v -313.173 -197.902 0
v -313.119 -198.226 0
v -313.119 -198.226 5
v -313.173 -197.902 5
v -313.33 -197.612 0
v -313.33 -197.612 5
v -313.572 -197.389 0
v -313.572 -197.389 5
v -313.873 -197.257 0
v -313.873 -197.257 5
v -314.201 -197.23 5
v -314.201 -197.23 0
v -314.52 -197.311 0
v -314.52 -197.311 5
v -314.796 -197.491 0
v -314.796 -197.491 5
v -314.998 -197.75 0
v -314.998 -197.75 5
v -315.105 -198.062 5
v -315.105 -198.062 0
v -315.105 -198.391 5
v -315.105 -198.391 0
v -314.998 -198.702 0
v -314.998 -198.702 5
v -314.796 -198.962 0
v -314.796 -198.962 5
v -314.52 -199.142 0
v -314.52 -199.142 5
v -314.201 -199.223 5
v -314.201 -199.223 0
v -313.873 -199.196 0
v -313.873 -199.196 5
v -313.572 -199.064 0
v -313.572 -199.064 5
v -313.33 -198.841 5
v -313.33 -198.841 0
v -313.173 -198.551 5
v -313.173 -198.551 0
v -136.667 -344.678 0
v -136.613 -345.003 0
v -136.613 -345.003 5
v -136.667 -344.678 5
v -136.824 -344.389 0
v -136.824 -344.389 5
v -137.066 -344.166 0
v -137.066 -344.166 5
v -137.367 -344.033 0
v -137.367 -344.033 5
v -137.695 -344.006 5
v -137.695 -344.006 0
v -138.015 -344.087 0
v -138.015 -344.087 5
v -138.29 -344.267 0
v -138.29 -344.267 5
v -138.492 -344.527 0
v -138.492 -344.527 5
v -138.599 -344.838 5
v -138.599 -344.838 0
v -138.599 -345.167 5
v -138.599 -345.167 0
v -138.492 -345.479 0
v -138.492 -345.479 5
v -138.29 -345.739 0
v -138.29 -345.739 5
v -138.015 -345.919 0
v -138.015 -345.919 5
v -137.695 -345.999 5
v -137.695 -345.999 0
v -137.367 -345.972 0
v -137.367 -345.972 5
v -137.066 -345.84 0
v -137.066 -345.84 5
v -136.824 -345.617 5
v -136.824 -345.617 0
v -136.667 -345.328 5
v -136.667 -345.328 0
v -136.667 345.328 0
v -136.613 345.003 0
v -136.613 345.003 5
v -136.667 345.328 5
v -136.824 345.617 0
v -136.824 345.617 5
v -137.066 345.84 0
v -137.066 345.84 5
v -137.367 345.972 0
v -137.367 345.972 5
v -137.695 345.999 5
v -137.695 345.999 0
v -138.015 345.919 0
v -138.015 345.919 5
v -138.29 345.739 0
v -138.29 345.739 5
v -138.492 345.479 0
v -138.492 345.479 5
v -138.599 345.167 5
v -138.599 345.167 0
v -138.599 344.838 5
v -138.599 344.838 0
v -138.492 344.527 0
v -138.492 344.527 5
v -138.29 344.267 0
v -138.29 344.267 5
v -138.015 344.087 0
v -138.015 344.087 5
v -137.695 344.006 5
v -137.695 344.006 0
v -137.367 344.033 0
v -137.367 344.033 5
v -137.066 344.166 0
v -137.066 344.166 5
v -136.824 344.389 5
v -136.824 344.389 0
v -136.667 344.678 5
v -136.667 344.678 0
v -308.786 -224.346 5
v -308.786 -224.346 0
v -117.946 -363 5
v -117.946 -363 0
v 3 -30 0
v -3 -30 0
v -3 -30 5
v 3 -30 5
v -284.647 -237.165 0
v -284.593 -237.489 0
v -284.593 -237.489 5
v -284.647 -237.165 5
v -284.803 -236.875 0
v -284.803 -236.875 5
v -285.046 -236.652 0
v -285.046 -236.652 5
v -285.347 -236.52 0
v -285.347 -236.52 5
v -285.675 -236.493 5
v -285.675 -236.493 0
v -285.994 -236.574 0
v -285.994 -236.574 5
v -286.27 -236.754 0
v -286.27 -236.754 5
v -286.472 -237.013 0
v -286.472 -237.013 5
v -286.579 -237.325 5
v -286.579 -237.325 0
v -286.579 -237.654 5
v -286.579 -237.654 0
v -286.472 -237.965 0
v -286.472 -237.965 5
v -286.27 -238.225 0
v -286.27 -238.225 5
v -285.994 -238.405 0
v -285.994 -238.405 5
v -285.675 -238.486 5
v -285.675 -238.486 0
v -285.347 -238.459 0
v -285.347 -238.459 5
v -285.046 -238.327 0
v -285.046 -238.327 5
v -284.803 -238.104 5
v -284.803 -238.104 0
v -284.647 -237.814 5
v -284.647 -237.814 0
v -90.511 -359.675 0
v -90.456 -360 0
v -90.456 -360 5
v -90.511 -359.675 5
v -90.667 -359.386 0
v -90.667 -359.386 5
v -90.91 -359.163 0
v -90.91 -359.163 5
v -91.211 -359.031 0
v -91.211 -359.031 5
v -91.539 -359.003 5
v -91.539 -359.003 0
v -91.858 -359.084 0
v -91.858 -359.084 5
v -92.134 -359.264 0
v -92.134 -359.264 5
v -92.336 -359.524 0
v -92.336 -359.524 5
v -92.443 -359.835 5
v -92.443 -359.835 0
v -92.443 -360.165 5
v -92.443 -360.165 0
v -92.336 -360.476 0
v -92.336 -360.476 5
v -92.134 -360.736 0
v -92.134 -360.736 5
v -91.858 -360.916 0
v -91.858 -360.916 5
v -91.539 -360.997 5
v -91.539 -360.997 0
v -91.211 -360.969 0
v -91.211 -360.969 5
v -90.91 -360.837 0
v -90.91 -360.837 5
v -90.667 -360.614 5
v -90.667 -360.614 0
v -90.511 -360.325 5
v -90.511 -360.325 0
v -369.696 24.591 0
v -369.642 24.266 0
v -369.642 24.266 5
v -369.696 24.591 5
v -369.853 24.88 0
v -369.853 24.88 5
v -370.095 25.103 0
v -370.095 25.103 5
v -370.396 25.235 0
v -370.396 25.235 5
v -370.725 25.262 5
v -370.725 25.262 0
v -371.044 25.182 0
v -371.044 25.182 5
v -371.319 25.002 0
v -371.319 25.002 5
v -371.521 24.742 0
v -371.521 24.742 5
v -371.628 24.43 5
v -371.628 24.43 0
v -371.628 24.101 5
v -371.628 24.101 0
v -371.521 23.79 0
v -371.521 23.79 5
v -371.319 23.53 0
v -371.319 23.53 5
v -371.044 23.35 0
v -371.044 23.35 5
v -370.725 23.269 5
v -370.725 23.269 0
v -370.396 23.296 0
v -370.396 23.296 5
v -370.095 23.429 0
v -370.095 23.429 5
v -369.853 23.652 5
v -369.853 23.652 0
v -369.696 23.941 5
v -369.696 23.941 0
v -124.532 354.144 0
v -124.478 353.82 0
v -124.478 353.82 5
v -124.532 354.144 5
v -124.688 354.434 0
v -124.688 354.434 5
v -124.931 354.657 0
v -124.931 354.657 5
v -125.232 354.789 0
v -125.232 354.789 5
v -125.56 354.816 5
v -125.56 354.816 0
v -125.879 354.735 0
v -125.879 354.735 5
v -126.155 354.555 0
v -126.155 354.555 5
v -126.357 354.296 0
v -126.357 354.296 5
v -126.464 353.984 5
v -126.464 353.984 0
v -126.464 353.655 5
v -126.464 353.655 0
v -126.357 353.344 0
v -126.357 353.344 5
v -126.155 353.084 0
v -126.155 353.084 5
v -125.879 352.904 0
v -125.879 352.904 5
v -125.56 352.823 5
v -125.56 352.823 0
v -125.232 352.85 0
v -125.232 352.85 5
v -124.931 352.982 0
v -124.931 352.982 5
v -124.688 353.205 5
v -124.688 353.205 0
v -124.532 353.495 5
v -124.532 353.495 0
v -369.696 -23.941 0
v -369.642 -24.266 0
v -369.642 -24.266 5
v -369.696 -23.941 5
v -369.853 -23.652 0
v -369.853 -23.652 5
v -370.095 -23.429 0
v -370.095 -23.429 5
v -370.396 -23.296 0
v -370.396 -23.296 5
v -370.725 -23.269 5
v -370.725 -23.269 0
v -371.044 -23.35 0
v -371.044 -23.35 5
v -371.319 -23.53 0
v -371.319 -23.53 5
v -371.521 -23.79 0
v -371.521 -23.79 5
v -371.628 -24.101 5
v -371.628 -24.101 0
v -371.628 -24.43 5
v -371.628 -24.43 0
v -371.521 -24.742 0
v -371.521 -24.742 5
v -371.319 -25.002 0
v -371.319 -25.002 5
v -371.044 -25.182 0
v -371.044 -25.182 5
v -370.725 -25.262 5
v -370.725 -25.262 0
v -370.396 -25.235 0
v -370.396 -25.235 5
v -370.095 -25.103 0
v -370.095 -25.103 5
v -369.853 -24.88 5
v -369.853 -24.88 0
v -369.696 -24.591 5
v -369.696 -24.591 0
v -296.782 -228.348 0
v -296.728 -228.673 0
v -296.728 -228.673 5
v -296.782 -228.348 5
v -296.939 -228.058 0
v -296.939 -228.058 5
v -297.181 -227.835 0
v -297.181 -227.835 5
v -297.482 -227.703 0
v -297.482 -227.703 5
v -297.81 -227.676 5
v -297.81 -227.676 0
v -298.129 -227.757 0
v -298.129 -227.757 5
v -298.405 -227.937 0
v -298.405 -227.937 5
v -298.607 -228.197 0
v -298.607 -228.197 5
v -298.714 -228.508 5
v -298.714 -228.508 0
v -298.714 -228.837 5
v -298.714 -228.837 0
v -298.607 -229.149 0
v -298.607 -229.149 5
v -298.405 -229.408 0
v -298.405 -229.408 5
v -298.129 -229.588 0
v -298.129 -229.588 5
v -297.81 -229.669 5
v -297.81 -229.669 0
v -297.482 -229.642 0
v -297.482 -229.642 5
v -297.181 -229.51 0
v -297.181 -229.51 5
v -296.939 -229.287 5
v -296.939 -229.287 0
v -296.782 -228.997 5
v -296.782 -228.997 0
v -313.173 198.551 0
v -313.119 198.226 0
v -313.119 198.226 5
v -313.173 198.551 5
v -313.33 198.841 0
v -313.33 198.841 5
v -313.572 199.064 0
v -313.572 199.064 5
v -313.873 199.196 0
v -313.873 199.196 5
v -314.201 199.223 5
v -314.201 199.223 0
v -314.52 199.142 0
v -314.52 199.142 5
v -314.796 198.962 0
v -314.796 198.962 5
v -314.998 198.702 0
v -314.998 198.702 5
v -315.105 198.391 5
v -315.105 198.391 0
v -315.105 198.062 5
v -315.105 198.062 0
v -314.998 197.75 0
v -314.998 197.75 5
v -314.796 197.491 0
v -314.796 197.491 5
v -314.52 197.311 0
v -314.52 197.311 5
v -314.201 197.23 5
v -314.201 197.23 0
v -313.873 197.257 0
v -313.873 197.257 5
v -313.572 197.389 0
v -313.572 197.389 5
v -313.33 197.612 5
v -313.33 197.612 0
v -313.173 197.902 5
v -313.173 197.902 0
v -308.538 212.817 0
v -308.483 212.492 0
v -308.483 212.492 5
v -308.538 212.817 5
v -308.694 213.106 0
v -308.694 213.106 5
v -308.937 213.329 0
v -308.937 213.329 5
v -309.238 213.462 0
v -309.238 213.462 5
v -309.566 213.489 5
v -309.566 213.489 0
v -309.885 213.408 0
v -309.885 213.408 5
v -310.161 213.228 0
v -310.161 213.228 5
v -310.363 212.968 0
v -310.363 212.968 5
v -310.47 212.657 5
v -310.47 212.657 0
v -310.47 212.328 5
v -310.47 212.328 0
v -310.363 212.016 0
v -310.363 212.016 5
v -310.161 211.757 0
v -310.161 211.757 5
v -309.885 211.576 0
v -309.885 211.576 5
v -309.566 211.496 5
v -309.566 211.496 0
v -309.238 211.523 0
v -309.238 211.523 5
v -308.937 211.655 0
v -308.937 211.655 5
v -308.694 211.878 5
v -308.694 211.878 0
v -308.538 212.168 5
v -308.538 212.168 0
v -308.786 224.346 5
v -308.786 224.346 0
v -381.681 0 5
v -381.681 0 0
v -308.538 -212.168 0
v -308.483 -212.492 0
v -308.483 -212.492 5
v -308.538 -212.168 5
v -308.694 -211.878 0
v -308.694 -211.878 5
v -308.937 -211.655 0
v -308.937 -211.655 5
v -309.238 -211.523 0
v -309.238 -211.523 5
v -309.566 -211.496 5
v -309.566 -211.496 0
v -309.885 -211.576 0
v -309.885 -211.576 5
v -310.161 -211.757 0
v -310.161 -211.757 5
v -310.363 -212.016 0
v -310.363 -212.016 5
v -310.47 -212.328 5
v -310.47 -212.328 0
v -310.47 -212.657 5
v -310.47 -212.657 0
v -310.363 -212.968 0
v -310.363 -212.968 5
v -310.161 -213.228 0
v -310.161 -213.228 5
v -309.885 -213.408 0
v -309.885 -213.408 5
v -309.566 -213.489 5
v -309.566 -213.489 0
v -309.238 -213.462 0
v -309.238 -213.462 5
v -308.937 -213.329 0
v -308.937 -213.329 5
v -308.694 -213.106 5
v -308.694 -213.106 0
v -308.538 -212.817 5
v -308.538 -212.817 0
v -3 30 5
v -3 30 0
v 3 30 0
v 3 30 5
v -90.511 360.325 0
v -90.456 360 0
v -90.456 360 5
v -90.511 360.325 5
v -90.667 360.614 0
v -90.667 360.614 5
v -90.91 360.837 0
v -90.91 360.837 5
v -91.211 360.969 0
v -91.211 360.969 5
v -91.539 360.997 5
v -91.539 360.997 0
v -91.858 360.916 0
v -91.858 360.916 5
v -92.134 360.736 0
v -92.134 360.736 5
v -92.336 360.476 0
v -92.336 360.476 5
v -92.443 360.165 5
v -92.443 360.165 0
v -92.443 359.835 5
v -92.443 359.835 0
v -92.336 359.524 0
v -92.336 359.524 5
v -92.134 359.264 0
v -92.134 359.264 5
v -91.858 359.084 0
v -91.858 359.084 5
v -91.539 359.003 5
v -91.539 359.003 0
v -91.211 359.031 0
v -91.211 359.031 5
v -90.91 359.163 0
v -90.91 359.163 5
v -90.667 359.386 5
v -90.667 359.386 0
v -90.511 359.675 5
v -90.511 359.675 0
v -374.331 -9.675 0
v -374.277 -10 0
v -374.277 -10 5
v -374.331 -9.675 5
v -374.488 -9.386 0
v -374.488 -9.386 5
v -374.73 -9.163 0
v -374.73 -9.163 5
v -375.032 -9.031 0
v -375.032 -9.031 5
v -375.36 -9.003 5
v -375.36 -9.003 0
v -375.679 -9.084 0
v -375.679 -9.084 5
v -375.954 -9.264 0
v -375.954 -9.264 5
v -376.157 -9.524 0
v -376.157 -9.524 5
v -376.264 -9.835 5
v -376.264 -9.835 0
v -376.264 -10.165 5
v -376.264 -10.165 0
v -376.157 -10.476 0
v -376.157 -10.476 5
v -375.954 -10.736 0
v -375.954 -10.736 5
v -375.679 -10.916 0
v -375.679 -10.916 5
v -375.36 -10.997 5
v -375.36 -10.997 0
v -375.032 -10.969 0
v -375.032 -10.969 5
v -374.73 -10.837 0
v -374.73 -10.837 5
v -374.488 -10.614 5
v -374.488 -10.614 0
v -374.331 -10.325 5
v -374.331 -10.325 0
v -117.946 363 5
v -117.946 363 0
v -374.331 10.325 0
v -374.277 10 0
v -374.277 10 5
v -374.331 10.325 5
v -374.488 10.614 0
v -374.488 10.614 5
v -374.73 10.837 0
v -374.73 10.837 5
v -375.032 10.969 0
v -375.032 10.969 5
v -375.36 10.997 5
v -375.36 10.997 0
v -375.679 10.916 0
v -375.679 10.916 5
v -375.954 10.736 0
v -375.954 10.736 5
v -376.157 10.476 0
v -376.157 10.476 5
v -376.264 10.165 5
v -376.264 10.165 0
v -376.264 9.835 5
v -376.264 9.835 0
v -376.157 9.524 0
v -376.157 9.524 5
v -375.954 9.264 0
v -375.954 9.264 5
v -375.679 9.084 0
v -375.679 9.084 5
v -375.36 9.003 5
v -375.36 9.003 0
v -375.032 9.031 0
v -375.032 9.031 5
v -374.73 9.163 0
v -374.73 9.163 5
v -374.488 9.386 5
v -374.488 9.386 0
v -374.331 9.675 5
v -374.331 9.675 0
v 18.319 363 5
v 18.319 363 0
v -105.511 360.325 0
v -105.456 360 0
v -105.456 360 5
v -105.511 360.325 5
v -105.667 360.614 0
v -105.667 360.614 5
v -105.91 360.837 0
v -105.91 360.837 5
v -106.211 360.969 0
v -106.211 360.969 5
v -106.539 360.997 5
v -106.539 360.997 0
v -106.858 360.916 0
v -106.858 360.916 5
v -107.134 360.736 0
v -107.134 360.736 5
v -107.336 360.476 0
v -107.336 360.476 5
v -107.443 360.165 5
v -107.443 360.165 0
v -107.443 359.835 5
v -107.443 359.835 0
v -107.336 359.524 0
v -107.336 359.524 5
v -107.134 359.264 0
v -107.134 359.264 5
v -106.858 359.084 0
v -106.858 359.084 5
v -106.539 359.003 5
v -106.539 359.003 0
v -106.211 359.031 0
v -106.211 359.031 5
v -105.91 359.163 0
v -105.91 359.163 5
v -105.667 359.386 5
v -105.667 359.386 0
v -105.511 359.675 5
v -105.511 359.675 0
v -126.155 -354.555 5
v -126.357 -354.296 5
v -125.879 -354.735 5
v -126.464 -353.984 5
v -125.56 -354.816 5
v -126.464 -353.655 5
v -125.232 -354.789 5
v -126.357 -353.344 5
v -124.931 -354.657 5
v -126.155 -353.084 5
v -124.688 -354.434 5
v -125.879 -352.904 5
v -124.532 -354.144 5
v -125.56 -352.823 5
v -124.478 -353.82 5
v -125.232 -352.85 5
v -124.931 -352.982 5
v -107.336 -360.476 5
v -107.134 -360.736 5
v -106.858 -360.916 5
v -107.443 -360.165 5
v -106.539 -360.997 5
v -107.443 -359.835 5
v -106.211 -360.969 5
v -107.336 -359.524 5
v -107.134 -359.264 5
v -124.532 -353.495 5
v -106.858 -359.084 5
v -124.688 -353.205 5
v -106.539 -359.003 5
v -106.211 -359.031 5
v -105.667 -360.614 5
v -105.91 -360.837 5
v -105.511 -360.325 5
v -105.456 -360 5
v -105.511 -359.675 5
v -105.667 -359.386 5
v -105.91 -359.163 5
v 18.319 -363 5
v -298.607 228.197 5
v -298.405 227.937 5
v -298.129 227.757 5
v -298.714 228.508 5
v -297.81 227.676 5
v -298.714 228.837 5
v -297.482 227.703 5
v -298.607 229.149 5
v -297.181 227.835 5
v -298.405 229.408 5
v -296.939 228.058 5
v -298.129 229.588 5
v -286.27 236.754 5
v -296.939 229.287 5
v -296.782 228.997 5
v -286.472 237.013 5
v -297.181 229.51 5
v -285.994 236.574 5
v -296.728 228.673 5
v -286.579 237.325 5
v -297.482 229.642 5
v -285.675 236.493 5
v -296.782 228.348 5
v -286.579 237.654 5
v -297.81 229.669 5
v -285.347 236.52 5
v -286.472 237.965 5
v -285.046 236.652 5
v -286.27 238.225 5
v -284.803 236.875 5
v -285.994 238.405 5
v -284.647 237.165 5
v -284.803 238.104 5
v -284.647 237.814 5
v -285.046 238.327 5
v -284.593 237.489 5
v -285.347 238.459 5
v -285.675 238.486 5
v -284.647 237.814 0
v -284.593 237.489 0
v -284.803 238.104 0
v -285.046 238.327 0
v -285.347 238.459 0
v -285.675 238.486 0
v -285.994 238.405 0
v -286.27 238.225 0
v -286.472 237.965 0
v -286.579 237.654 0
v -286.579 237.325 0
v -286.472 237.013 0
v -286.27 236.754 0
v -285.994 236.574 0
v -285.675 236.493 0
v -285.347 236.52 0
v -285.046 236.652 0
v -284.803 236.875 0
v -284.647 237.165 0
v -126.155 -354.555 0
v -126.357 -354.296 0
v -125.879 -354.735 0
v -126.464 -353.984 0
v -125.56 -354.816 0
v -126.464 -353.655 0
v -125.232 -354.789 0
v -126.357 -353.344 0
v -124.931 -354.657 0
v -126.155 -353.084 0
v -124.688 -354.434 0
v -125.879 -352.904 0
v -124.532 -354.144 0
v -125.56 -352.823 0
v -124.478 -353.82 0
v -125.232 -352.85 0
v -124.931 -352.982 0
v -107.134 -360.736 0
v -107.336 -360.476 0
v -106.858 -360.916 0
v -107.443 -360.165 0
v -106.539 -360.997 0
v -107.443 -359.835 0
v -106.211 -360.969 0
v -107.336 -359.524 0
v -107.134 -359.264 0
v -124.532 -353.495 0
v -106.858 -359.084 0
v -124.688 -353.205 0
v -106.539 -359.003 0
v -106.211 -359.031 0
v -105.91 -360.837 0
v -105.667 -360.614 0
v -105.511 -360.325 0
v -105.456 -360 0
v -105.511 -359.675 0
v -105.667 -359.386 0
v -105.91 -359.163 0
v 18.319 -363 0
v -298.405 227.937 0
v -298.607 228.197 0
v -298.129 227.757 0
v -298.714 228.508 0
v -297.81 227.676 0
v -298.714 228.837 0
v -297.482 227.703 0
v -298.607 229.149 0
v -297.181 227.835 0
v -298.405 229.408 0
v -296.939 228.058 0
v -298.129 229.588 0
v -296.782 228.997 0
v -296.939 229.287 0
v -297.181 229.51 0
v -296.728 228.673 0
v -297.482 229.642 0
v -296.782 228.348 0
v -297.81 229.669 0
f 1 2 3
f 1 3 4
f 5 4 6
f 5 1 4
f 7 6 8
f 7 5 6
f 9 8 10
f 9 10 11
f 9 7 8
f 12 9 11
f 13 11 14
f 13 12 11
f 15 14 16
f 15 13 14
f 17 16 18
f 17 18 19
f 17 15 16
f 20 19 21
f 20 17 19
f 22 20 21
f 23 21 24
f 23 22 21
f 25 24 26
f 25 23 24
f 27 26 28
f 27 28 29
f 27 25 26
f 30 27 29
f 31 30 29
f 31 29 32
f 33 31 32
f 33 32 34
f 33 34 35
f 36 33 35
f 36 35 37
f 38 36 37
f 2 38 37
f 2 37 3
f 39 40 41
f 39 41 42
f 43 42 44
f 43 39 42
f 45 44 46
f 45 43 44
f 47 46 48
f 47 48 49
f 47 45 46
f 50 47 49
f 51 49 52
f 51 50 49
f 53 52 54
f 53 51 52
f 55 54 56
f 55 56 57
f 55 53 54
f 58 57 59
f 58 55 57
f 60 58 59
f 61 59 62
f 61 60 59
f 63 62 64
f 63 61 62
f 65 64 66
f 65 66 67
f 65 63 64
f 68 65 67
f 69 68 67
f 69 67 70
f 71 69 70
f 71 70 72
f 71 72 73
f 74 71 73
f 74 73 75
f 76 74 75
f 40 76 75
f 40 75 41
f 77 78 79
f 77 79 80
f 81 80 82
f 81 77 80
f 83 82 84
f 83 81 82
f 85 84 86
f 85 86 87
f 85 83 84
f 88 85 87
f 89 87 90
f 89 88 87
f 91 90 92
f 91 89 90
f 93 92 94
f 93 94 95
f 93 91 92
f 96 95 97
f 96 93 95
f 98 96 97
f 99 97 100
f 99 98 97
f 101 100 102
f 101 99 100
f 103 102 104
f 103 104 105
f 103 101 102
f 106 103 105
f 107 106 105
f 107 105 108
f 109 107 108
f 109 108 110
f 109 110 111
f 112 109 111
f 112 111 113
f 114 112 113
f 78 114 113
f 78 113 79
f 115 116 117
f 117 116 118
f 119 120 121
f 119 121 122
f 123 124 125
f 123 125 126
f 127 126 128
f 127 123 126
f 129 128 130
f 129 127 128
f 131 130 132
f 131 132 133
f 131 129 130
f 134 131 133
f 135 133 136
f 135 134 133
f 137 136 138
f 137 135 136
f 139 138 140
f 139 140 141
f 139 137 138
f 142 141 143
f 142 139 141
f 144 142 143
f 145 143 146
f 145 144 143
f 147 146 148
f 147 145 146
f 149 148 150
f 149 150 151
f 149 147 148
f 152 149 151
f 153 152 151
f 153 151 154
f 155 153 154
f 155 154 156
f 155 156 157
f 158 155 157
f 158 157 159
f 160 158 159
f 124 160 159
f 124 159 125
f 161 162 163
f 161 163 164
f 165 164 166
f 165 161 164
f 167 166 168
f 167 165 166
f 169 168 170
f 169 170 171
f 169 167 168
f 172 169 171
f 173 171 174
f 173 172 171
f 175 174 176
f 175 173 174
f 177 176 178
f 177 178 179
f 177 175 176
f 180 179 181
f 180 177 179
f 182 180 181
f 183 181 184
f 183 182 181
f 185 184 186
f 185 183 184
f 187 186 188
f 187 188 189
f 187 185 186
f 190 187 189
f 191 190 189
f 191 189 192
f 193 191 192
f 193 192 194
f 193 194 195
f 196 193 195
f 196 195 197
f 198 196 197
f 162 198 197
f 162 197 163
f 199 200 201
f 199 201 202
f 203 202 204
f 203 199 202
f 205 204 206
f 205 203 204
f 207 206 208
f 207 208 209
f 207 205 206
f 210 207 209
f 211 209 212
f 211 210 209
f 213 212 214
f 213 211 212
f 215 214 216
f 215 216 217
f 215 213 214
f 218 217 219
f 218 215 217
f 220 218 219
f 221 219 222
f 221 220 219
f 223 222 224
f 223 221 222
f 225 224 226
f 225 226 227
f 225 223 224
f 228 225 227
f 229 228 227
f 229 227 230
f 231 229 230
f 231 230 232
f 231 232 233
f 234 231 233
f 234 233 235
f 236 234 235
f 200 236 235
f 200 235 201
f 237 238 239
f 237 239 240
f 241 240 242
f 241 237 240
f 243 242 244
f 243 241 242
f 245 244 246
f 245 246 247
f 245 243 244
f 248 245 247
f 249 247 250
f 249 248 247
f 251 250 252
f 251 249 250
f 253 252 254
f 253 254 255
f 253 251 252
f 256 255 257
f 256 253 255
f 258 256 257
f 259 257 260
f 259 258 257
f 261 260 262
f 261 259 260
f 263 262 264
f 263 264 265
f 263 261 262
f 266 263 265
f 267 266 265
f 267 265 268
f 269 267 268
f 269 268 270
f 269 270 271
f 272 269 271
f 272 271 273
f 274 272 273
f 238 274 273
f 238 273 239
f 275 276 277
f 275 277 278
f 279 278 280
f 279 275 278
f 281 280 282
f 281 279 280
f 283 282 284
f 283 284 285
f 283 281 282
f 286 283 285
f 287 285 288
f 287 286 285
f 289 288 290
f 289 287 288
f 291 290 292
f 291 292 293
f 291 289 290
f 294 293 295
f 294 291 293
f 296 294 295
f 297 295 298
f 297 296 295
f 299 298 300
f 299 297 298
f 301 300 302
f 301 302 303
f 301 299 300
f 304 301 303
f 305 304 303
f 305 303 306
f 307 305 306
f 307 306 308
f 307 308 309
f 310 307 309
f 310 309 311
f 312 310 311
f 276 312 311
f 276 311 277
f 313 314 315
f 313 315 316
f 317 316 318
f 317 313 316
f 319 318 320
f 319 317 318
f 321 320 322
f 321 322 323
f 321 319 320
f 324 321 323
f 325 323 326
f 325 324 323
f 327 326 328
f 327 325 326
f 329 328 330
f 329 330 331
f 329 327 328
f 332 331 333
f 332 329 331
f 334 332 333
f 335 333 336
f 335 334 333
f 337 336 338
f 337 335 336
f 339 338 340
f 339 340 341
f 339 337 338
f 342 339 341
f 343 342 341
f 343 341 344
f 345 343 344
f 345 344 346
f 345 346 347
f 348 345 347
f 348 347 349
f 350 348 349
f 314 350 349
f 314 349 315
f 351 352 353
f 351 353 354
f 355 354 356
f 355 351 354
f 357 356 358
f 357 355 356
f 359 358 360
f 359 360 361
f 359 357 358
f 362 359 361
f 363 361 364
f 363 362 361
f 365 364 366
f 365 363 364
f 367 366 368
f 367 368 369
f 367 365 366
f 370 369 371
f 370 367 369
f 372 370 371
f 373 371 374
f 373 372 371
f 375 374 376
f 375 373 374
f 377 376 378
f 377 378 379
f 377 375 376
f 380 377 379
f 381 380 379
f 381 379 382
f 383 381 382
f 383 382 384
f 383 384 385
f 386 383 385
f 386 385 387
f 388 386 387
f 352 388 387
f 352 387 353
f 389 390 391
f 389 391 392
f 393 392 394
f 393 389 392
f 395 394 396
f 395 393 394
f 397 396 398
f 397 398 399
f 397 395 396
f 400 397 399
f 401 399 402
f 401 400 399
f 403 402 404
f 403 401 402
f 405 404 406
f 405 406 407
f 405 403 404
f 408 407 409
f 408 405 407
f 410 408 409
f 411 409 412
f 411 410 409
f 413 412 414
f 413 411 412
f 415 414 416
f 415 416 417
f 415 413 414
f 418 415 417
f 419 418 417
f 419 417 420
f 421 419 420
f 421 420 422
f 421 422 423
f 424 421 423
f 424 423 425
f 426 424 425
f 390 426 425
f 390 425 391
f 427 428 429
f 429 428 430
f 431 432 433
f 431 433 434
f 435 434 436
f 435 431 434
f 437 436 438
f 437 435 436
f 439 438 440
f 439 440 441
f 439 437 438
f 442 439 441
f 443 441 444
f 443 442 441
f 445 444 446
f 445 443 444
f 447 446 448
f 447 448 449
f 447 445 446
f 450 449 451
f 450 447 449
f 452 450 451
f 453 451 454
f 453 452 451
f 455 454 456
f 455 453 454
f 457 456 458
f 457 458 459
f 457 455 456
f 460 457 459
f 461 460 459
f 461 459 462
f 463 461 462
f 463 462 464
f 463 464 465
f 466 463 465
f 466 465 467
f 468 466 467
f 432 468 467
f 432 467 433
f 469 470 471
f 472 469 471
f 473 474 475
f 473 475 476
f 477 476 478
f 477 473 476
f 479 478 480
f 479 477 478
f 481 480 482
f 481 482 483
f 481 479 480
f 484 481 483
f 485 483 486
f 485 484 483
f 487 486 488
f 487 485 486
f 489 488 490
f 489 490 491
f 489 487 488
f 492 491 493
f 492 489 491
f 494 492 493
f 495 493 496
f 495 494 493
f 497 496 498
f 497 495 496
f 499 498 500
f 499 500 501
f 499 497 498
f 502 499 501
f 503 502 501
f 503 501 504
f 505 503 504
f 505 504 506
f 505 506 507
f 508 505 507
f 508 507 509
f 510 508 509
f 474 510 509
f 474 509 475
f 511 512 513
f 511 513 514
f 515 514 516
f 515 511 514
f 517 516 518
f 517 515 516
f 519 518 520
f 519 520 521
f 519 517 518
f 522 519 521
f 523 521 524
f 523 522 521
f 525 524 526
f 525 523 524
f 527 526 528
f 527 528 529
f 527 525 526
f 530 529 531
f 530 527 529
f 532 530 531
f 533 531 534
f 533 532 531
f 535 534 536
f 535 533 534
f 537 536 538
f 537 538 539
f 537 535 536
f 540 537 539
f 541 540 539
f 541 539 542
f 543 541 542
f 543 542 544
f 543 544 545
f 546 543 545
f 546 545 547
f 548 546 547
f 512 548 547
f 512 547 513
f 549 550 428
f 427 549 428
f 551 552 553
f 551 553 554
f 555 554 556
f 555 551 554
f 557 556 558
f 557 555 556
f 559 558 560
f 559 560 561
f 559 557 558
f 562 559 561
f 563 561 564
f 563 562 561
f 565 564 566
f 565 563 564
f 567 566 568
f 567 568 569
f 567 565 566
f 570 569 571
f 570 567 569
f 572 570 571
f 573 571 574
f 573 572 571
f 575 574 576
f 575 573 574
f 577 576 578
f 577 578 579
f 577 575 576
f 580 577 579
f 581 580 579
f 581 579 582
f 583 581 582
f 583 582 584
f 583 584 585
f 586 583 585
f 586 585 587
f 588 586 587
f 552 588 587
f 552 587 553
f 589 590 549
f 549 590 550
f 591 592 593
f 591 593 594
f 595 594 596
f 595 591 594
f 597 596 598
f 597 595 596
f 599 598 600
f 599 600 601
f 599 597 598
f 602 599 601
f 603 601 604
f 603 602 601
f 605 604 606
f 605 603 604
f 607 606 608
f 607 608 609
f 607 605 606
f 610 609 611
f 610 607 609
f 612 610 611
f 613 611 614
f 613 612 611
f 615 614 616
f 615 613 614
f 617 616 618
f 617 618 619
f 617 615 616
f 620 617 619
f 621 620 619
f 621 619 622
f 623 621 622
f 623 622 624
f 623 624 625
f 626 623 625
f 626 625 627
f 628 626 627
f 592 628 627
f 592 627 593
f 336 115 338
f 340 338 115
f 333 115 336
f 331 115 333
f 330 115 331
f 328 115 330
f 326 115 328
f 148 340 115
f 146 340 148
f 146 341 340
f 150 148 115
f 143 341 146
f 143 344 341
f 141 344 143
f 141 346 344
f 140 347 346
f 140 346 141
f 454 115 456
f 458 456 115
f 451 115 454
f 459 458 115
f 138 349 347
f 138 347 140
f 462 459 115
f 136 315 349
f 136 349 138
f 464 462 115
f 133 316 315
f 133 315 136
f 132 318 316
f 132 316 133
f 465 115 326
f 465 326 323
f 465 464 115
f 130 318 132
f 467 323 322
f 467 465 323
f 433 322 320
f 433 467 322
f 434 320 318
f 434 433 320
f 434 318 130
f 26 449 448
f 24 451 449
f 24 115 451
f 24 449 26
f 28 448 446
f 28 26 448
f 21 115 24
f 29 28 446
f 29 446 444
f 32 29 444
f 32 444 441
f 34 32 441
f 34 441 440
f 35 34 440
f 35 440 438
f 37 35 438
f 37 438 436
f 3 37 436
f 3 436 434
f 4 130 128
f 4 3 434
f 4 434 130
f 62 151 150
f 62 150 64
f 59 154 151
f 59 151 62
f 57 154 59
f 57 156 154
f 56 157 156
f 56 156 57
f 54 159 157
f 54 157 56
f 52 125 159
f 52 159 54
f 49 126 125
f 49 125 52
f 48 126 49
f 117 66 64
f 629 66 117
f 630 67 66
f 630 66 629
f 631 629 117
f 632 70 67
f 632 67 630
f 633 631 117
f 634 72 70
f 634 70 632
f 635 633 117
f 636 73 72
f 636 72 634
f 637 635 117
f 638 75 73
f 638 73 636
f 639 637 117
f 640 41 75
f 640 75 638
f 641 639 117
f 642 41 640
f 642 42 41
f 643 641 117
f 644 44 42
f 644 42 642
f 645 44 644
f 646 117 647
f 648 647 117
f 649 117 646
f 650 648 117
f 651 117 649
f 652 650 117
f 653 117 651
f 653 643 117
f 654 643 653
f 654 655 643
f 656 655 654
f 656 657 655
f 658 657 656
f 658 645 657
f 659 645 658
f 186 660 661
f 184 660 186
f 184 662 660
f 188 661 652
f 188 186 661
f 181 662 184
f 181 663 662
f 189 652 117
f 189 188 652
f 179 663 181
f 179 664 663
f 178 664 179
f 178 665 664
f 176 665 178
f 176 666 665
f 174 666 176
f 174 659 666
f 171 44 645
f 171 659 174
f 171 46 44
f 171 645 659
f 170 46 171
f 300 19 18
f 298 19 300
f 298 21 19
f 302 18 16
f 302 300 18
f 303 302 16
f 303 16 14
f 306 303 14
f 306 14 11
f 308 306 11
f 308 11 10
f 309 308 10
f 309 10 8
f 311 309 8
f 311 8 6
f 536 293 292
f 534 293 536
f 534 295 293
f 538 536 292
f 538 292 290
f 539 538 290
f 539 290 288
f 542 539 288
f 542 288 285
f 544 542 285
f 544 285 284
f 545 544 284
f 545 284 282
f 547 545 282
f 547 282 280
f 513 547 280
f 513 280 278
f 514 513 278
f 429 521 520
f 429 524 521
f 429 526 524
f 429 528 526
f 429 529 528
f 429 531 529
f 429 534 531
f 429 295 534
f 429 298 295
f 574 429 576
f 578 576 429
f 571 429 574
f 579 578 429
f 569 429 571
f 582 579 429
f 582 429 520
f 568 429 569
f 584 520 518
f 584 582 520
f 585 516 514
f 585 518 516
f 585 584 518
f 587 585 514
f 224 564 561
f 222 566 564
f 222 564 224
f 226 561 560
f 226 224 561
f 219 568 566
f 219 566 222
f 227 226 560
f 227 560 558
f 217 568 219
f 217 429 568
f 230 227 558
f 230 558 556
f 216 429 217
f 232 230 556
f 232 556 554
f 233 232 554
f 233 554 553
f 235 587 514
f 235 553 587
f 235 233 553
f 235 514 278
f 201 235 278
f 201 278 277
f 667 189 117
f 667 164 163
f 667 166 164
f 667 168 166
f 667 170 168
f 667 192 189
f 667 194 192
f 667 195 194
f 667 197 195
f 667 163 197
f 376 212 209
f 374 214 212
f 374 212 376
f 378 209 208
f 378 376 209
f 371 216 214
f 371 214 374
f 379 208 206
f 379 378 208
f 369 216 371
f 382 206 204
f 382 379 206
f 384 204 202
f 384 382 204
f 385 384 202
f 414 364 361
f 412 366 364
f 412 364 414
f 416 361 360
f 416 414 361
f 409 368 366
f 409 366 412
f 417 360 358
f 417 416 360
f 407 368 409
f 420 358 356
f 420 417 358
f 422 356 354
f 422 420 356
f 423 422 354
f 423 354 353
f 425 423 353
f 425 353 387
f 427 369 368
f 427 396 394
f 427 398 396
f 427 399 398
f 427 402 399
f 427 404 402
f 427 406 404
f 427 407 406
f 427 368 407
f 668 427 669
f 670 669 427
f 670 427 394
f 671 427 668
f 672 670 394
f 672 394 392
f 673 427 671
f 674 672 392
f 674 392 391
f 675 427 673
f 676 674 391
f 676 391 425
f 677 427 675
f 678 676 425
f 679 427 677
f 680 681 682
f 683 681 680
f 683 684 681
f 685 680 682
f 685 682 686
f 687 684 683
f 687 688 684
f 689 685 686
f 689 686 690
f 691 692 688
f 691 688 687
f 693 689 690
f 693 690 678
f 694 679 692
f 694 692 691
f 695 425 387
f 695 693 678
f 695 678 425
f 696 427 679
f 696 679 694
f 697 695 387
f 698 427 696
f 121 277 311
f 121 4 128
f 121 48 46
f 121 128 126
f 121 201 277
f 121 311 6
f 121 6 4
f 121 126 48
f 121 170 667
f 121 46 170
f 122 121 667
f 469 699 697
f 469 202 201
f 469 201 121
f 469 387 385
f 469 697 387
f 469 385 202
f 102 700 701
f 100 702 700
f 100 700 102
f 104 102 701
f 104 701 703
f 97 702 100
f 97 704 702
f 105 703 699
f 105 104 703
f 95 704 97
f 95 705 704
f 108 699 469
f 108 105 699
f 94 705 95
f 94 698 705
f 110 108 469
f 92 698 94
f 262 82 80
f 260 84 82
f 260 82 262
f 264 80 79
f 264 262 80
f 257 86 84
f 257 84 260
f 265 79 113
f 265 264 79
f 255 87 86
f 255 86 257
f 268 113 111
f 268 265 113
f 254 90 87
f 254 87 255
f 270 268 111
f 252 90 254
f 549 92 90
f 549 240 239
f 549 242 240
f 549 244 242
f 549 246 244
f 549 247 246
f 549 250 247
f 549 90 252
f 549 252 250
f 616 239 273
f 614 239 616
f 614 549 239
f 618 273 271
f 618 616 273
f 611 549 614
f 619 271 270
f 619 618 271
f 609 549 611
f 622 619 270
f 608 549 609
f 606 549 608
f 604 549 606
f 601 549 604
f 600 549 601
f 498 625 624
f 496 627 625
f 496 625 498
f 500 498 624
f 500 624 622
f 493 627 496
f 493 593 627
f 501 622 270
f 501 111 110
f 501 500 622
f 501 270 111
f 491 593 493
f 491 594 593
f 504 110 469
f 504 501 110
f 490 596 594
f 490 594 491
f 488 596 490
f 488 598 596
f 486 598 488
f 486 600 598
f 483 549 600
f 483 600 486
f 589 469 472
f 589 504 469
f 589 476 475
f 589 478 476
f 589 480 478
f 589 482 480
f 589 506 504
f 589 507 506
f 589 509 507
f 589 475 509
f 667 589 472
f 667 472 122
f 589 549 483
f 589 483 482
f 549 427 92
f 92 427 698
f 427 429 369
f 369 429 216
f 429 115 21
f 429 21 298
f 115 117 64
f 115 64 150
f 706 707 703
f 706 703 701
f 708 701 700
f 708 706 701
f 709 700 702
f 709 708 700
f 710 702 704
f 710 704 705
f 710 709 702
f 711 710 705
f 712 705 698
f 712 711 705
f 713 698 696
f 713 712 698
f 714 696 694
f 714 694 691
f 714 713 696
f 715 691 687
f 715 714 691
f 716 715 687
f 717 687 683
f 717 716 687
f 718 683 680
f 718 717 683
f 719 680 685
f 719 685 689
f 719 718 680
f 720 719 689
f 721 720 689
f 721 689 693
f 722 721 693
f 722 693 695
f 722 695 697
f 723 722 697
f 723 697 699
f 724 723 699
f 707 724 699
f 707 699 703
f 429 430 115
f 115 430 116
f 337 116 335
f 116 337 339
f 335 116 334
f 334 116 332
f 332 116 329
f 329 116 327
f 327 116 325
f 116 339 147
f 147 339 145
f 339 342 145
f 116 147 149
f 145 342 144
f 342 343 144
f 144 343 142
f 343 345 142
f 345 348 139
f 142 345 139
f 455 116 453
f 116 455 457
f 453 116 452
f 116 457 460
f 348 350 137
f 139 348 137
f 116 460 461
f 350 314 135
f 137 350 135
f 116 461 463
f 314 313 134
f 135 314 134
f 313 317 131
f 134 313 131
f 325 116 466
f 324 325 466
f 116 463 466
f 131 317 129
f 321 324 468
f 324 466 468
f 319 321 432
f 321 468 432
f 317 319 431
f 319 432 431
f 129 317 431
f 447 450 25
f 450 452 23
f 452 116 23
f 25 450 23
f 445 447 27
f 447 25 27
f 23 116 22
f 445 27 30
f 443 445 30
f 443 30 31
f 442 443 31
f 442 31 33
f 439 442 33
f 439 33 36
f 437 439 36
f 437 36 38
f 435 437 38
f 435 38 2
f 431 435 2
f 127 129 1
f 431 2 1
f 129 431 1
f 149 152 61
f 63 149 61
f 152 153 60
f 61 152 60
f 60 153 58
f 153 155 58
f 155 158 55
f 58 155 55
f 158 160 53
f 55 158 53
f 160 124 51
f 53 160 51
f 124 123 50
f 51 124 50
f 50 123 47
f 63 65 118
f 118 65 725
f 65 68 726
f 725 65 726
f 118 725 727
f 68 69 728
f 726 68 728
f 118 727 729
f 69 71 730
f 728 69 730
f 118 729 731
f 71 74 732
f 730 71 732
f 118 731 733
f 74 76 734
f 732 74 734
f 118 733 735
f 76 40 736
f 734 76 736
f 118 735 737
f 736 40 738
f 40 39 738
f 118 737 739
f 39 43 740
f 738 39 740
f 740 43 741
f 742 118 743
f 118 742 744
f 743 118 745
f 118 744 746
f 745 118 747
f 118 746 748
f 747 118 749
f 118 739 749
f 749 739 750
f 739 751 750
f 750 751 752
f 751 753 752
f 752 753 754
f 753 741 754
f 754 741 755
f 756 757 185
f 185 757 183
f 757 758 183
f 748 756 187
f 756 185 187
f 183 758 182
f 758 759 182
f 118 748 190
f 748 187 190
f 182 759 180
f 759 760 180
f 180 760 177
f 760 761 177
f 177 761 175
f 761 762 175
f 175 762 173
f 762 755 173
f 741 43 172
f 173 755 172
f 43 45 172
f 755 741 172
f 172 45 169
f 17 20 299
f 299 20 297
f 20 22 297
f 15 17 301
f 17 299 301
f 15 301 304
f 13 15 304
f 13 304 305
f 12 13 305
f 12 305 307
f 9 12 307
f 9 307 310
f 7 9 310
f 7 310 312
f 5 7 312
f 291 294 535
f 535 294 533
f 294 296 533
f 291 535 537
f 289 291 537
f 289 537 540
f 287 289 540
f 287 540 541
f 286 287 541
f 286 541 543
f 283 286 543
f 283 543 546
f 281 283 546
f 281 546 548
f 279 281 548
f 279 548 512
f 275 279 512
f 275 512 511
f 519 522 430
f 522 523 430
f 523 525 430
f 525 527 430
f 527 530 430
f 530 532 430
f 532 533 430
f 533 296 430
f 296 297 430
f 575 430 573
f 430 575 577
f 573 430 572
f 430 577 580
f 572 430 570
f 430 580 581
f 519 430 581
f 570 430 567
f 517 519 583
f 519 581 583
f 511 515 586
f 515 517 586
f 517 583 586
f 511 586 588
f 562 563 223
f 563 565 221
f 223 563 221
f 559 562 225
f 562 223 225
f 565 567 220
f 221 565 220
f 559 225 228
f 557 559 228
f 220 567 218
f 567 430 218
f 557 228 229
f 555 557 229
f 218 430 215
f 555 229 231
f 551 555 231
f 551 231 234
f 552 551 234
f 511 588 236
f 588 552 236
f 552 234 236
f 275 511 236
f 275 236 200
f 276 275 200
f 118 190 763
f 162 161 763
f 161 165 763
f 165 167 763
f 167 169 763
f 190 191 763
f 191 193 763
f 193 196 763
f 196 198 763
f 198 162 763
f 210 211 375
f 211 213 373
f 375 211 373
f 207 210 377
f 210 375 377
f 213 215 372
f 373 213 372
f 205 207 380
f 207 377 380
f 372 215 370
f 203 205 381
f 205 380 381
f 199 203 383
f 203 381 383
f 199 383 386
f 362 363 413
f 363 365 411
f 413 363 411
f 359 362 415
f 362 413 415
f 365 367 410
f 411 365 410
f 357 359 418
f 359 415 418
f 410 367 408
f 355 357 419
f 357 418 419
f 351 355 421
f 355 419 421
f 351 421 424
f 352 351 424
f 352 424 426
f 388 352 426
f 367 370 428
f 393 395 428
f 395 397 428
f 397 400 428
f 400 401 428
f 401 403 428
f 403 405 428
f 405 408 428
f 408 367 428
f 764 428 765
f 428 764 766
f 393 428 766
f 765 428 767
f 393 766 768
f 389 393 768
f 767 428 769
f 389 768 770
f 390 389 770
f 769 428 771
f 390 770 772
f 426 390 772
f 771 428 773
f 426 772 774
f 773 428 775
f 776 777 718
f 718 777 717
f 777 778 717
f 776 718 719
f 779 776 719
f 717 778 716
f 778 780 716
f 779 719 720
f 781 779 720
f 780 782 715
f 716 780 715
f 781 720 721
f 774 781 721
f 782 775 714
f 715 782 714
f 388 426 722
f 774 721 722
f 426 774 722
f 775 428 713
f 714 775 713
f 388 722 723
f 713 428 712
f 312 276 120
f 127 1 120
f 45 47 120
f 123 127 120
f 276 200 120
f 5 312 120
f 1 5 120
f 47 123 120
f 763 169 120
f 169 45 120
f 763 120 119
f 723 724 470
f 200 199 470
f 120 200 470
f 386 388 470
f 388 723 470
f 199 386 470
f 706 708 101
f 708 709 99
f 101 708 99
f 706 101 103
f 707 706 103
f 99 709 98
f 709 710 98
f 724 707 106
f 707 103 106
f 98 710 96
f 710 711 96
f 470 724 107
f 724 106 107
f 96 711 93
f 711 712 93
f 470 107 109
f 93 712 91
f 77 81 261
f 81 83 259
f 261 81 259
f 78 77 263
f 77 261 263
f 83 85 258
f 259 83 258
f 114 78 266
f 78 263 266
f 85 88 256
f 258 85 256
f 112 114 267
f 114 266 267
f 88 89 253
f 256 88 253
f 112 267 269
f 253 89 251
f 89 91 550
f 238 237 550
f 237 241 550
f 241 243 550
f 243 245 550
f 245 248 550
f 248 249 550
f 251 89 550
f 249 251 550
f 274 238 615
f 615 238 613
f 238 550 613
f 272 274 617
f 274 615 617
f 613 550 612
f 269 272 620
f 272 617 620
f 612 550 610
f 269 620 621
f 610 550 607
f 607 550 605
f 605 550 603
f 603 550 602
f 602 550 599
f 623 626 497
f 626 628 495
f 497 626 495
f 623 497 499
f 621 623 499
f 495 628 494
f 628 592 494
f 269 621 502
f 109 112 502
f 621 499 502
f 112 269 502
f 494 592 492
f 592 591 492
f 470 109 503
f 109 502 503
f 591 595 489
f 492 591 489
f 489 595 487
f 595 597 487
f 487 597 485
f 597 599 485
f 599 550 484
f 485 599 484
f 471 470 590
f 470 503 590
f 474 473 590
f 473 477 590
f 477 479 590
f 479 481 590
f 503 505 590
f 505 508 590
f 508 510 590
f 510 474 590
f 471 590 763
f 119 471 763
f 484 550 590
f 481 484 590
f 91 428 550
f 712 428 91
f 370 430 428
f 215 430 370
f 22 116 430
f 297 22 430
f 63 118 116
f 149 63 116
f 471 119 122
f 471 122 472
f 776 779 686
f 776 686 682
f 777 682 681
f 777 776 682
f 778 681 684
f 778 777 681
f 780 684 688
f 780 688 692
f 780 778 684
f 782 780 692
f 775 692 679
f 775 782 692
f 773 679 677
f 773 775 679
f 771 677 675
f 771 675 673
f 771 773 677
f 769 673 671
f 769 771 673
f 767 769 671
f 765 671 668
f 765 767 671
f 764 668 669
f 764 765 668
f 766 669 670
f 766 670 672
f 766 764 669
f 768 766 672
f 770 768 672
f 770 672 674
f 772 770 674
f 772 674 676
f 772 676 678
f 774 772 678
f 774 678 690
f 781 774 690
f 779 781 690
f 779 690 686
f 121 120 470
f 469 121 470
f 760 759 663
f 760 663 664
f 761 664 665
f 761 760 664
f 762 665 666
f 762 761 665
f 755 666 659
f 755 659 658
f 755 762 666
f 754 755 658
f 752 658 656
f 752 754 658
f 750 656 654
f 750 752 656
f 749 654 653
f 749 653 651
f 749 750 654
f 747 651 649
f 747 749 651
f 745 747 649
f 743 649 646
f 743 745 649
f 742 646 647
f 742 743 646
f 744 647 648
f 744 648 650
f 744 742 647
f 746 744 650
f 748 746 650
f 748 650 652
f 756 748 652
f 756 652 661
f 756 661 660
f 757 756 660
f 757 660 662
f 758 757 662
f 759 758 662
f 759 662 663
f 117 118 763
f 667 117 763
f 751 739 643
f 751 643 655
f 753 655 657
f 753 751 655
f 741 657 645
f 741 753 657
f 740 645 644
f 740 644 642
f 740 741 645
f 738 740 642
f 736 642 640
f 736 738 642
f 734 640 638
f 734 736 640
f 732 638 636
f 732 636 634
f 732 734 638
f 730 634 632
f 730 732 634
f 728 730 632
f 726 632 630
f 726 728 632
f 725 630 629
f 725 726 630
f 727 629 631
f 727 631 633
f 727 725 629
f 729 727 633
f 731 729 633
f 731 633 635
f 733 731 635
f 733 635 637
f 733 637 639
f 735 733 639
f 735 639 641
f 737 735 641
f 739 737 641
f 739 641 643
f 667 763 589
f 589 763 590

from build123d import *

# Parameters (mm, degrees)
F0_R     = 1
F0_W     = 6
F0_H     = 60
F1_DEPTH = 5


with BuildPart() as f1:
    # F0 (on Top) → F1 (new body)
    with BuildSketch(Plane.XY):
        Polygon((-117.94585, -363), (18.319213, -363), (18.319213, 363), (-117.94585, 363), (-308.786243, 224.346338), (-381.680787, 0), (-308.786243, -224.346338), align=None)
        with Locations((-297.727783, -228.672576)):
            Circle(F0_R, mode=Mode.SUBTRACT)
        with Locations((-309.483488, -212.492236)):
            Circle(F0_R, mode=Mode.SUBTRACT)
        with Locations((-314.118743, -198.226388)):
            Circle(F0_R, mode=Mode.SUBTRACT)
        with Locations((-285.592528, -237.489355)):
            Circle(F0_R, mode=Mode.SUBTRACT)
        with Locations((-125.477599, -353.81966)):
            Circle(F0_R, mode=Mode.SUBTRACT)
        with Locations((-137.612854, -345.002881)):
            Circle(F0_R, mode=Mode.SUBTRACT)
        with Locations((-106.456468, -360)):
            Circle(F0_R, mode=Mode.SUBTRACT)
        with Locations((-91.456468, -360)):
            Circle(F0_R, mode=Mode.SUBTRACT)
        with Locations((-370.641949, -24.265848)):
            Circle(F0_R, mode=Mode.SUBTRACT)
        with Locations((-375.277204, -10)):
            Circle(F0_R, mode=Mode.SUBTRACT)
        with Locations((-375.277204, 10)):
            Circle(F0_R, mode=Mode.SUBTRACT)
        with Locations((-370.641949, 24.265848)):
            Circle(F0_R, mode=Mode.SUBTRACT)
        with Locations((-314.118743, 198.226388)):
            Circle(F0_R, mode=Mode.SUBTRACT)
        with Locations((-309.483488, 212.492236)):
            Circle(F0_R, mode=Mode.SUBTRACT)
        with Locations((-297.727783, 228.672576)):
            Circle(F0_R, mode=Mode.SUBTRACT)
        with Locations((-285.592528, 237.489355)):
            Circle(F0_R, mode=Mode.SUBTRACT)
        with Locations((-137.612854, 345.002881)):
            Circle(F0_R, mode=Mode.SUBTRACT)
        with Locations((-125.477599, 353.81966)):
            Circle(F0_R, mode=Mode.SUBTRACT)
        with Locations((-106.456468, 360)):
            Circle(F0_R, mode=Mode.SUBTRACT)
        with Locations((-91.456468, 360)):
            Circle(F0_R, mode=Mode.SUBTRACT)
        Rectangle(F0_W, F0_H, mode=Mode.SUBTRACT)
    extrude(amount=F1_DEPTH)


solid = f1.part
